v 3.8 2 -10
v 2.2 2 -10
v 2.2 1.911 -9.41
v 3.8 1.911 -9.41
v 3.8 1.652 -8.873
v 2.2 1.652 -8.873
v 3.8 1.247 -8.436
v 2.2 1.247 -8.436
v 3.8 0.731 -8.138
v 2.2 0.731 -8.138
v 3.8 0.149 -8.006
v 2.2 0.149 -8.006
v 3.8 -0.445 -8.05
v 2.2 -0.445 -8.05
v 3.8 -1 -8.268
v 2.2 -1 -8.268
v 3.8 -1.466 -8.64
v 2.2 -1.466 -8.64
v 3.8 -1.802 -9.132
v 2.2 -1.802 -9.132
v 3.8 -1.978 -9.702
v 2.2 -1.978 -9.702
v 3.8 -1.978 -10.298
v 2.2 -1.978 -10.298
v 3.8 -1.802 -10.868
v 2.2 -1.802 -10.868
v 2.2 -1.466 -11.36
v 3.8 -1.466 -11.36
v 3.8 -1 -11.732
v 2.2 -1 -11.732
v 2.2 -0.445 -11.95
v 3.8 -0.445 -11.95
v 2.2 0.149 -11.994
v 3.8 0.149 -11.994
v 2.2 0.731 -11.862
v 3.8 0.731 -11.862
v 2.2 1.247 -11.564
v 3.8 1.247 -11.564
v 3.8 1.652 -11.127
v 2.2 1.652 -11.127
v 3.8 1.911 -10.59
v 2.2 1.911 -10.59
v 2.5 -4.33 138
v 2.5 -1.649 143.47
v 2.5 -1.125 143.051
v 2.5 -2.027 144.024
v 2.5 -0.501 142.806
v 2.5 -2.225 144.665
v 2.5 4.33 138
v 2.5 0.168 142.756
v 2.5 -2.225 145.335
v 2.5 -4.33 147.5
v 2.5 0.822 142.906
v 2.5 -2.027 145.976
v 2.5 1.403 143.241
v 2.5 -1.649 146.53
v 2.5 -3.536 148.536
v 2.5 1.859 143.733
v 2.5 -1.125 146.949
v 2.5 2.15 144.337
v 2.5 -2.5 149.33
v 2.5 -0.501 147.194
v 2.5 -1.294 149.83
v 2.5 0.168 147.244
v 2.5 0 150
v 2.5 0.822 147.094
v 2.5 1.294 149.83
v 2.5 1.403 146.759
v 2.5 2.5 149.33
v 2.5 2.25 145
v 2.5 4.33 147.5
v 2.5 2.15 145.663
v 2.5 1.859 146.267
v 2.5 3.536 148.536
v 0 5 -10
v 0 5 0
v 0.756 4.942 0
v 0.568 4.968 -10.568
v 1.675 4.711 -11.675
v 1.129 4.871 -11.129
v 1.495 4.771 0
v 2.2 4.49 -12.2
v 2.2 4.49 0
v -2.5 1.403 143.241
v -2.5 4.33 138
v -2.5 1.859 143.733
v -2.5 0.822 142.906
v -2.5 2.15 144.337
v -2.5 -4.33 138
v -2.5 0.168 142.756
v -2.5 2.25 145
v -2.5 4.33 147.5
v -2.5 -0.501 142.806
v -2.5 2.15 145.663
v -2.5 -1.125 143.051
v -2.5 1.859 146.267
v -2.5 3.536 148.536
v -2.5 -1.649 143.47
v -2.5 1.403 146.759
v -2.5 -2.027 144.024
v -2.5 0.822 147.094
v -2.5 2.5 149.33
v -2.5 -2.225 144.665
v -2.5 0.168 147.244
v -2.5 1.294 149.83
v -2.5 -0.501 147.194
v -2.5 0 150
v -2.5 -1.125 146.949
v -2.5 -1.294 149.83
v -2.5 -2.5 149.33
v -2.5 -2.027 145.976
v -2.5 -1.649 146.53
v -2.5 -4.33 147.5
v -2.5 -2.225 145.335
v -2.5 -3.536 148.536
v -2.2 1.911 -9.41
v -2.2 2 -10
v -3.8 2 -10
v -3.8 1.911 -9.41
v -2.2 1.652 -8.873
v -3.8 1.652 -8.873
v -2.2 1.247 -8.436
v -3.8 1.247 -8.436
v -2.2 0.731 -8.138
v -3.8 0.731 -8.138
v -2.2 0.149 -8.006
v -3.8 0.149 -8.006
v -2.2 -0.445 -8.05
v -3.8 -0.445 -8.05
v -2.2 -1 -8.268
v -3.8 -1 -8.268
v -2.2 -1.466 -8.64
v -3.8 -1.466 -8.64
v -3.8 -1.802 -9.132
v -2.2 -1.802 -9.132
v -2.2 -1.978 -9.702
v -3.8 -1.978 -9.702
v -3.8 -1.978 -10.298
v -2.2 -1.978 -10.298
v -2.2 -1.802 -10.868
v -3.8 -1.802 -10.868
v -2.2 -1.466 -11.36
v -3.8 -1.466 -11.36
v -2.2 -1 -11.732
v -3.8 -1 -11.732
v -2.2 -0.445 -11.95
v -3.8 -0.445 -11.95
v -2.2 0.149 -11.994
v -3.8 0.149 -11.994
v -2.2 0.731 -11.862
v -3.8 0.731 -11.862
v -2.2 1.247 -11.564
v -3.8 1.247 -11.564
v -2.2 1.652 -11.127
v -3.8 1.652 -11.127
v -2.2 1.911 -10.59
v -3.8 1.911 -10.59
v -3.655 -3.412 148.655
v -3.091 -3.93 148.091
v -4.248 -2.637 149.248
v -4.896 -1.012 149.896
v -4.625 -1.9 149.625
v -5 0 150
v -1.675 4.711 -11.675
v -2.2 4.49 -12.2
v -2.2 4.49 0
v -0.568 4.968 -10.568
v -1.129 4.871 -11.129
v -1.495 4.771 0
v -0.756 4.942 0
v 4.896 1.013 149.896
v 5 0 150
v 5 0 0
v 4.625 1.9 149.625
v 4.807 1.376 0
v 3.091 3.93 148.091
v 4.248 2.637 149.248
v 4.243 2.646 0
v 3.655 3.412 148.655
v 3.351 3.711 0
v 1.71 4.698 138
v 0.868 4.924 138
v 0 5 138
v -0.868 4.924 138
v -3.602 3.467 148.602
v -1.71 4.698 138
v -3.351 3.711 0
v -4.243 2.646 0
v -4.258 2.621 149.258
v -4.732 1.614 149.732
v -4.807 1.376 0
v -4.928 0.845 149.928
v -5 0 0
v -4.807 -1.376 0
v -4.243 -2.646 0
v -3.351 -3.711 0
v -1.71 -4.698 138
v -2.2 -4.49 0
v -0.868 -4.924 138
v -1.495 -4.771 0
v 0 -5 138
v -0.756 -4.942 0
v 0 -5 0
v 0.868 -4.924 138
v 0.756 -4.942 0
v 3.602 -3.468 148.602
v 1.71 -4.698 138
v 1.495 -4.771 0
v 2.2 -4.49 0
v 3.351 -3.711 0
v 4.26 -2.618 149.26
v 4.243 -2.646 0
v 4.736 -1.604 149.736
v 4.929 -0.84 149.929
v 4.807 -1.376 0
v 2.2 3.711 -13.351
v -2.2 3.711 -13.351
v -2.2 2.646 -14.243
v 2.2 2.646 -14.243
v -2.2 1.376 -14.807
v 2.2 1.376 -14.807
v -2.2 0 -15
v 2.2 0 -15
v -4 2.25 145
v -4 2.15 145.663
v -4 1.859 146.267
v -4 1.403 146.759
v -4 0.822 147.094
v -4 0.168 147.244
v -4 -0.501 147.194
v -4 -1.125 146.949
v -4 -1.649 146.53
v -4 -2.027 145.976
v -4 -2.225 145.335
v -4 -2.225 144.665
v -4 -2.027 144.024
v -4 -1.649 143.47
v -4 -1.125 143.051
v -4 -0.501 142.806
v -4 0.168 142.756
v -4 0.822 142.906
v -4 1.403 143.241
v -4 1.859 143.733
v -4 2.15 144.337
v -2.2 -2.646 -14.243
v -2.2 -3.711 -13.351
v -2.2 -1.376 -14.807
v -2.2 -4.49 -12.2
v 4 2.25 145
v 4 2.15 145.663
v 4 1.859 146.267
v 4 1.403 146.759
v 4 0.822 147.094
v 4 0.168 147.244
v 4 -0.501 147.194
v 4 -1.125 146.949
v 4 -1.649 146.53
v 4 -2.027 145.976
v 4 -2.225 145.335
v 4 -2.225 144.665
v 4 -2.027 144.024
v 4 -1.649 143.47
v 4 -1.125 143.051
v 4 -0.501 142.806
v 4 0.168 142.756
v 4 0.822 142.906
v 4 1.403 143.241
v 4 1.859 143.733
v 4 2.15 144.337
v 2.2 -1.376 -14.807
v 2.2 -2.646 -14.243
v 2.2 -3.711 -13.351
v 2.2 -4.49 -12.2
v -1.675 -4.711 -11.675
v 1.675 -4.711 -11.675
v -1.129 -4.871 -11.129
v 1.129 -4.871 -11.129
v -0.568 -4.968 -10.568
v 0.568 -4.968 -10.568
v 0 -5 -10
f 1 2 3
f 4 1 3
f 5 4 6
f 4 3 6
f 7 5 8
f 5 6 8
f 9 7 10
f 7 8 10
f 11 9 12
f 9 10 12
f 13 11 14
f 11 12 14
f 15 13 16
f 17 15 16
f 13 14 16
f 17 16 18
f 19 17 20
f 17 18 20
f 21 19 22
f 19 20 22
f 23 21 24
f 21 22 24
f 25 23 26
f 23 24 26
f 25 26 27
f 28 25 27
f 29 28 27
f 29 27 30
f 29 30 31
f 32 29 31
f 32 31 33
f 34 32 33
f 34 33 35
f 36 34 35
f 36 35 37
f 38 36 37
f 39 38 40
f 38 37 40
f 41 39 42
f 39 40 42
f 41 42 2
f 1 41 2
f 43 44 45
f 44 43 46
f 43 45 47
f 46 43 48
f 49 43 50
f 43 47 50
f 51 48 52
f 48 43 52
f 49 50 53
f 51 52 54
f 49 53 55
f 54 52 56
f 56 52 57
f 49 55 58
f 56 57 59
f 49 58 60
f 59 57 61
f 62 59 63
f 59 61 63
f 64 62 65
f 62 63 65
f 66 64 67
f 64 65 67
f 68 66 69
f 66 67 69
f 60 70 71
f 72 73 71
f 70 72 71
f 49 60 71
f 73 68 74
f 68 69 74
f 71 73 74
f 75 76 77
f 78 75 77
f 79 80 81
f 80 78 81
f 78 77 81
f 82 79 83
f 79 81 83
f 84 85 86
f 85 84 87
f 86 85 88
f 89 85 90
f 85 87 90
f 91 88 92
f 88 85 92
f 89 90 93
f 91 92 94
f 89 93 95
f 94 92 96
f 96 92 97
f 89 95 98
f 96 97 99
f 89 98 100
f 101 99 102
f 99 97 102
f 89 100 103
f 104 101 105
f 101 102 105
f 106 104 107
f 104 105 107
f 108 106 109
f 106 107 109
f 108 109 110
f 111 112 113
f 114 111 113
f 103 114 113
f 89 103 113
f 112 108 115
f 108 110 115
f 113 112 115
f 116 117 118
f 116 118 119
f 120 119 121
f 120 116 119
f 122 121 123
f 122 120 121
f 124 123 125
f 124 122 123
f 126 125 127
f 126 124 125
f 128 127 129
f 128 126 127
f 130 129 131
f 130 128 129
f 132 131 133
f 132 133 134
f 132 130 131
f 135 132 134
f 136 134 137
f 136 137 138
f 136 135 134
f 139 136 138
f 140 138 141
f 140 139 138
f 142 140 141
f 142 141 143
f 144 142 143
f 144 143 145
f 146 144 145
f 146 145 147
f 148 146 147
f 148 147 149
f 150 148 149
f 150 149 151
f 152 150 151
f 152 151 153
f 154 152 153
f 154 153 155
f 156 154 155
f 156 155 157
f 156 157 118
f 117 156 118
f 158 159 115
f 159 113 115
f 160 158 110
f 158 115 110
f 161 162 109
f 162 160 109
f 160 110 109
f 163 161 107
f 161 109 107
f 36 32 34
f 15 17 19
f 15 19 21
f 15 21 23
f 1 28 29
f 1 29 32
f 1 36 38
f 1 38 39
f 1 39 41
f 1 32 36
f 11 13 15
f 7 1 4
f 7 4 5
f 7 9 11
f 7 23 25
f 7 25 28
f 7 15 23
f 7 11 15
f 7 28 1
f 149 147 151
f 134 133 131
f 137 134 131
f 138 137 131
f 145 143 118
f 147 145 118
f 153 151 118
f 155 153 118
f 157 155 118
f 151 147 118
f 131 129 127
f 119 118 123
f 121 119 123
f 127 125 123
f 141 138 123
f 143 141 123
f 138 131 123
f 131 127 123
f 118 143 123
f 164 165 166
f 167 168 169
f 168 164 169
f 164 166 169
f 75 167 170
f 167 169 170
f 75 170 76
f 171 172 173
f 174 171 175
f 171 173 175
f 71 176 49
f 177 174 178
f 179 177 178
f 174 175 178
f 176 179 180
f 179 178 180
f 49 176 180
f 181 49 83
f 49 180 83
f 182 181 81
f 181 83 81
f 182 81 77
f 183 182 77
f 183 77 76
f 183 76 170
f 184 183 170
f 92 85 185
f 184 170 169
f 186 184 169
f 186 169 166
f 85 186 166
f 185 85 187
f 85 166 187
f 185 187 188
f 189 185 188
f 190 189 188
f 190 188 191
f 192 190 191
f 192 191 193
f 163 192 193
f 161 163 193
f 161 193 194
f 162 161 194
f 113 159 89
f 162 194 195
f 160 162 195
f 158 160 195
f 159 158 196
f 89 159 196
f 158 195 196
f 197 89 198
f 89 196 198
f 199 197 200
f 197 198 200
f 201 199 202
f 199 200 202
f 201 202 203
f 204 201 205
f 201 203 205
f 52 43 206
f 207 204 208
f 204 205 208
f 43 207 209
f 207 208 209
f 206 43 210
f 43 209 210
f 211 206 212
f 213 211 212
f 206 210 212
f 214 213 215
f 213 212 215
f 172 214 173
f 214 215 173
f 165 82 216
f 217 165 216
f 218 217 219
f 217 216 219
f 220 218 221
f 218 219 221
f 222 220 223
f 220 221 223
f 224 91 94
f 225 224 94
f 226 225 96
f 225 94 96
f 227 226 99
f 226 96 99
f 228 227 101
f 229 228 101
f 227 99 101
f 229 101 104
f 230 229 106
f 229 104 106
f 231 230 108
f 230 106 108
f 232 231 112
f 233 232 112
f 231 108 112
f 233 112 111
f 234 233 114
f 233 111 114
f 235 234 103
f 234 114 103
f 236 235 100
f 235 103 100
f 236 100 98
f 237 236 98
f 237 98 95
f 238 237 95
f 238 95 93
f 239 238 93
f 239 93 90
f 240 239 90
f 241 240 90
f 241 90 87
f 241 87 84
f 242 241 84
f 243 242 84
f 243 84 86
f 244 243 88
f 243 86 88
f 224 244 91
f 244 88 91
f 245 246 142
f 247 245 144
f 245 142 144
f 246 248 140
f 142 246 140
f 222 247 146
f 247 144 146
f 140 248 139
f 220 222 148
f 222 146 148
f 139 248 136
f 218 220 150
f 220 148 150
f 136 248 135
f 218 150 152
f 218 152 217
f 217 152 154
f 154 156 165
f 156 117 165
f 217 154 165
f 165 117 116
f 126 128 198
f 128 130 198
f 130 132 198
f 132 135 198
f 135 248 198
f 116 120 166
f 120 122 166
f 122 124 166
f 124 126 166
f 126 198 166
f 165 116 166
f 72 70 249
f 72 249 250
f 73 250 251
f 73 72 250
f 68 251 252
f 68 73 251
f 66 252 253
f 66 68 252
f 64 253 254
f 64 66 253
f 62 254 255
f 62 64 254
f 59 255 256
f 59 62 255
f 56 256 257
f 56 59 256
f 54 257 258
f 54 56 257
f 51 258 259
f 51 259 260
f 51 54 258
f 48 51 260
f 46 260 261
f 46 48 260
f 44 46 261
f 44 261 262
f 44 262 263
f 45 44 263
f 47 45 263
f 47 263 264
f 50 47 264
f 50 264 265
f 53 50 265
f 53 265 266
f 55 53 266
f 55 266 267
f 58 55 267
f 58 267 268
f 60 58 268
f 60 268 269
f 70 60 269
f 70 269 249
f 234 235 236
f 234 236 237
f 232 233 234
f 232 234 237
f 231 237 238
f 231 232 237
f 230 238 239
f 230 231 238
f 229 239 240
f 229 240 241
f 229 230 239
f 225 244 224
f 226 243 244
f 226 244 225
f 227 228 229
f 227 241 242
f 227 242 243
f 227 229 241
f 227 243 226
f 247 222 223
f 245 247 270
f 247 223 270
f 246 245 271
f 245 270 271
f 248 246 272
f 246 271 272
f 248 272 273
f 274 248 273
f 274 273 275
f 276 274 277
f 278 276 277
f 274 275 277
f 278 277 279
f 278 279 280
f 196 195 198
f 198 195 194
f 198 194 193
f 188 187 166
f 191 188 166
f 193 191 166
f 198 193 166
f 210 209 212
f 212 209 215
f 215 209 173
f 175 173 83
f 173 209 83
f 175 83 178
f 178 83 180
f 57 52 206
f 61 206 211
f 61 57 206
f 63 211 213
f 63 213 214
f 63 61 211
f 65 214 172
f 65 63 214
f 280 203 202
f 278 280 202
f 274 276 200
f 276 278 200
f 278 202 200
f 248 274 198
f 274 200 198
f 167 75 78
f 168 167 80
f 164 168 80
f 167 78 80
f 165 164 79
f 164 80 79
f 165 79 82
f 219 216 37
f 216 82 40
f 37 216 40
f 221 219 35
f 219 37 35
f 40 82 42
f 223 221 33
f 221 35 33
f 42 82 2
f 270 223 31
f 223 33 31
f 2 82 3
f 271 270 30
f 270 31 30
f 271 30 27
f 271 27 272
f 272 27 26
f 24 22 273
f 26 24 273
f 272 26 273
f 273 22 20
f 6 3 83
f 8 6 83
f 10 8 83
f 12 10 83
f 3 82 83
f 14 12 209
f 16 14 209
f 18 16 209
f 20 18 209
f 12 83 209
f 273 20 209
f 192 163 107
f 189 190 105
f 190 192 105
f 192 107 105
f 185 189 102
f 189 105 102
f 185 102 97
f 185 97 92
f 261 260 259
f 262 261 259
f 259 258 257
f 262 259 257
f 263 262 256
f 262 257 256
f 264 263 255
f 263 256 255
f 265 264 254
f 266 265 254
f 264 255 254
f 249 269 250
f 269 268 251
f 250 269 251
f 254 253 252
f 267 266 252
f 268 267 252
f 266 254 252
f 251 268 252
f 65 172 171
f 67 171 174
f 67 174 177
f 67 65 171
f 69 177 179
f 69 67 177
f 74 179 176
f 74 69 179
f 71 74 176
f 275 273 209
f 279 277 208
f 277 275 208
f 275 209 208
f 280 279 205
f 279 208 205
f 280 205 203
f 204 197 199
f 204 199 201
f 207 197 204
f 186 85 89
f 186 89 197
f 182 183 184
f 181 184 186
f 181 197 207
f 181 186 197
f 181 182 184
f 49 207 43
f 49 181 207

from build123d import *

# Parameters (mm, degrees)
F0_R           = 5
F1_DEPTH       = 150
F3_DEPTH       = 15
F5_DEPTH       = 25
F6_R           = 2
F7_DEPTH       = 1.6
F7_DEPTH_BACK  = 6
F9_DEPTH       = 12
F10_R          = 2.25
F11_DEPTH      = 1.5
F11_DEPTH_BACK = 6.5
F13_DEPTH      = 2.501
F13_DEPTH_BACK = 7.501


with BuildPart() as f1:
    # F0 (on Top) → F1 (new body)
    with BuildSketch(Plane.XY):
        Circle(F0_R)
    extrude(amount=F1_DEPTH)

    # F2 (on face) → F3 (join)
    with BuildSketch(Plane(origin=(0, 0, 0), x_dir=(1, 0, 0), z_dir=(0, 0, -1))):
        with BuildLine():
            ThreePointArc((2.2, 4.4899888641), (1.1291713066, 4.8708286934), (0, 5))
            ThreePointArc((0, 5), (-1.1291713066, 4.8708286934), (-2.2, 4.4899888641))
            Line((-2.2, 4.4899888641), (-2.2, -4.4899888641))
            ThreePointArc((-2.2, -4.4899888641), (-1.1291713066, -4.8708286934), (0, -5))
            ThreePointArc((0, -5), (1.1291713066, -4.8708286934), (2.2, -4.4899888641))
            Line((2.2, -4.4899888641), (2.2, 4.4899888641))
        make_face()
    extrude(amount=F3_DEPTH)

    # F4 (on face) → F5 (cut)
    with BuildSketch(Plane.YZ.offset(2.2)):
        with BuildLine():
            Line((5, -15), (5, -10))
            ThreePointArc((5, -10), (4.8708286934, -11.1291713066), (4.4899888641, -12.2))
            Line((4.4899888641, -12.2), (4.4899888641, -15))
            Line((4.4899888641, -15), (5, -15))
        make_face()
        with BuildLine():
            Line((4.4899888641, -15), (4.4899888641, -12.2))
            ThreePointArc((4.4899888641, -12.2), (2.6457513111, -14.2426406871), (0, -15))
            Line((0, -15), (4.4899888641, -15))
        make_face()
        with BuildLine():
            Line((-4.4899888641, -15), (0, -15))
            ThreePointArc((0, -15), (-2.6457513111, -14.2426406871), (-4.4899888641, -12.2))
            Line((-4.4899888641, -12.2), (-4.4899888641, -15))
        make_face()
        with BuildLine():
            ThreePointArc((-4.4899888641, -12.2), (-4.8708286934, -11.1291713066), (-5, -10))
            Line((-5, -10), (-5, -15))
            Line((-5, -15), (-4.4899888641, -15))
            Line((-4.4899888641, -15), (-4.4899888641, -12.2))
        make_face()
    extrude(amount=-F5_DEPTH, mode=Mode.SUBTRACT)

    # F6 (on face) → F7 (join, two sides)
    with BuildSketch(Plane.YZ.offset(2.2)) as f7_sk:
        with Locations((0, -10)):
            Circle(F6_R)
    extrude(amount=F7_DEPTH)
    extrude(f7_sk.sketch, amount=-F7_DEPTH_BACK)

    # F8 (on face) → F9 (cut)
    with BuildSketch(Plane.XY.offset(150)):
        with BuildLine():
            ThreePointArc((2.5, 4.3301270189), (1.2940952255, 4.8296291314), (0, 5))
            ThreePointArc((0, 5), (-1.2940952255, 4.8296291314), (-2.5, 4.3301270189))
            Line((-2.5, 4.3301270189), (-2.5, -4.3301270189))
            ThreePointArc((-2.5, -4.3301270189), (-1.2940952255, -4.8296291314), (0, -5))
            ThreePointArc((0, -5), (1.2940952255, -4.8296291314), (2.5, -4.3301270189))
            Line((2.5, -4.3301270189), (2.5, 4.3301270189))
        make_face()
    extrude(amount=-F9_DEPTH, mode=Mode.SUBTRACT)

    # F10 (on face) → F11 (cut, two sides)
    with BuildSketch(Plane.YZ.offset(-2.5)) as f11_sk:
        with Locations((0, 145)):
            Circle(F10_R)
    extrude(amount=-F11_DEPTH, mode=Mode.SUBTRACT)
    extrude(f11_sk.sketch, amount=F11_DEPTH_BACK, mode=Mode.SUBTRACT)

    # F12 (on face) → F13 (cut, two sides)
    with BuildSketch(Plane.YZ.offset(-2.5)) as f13_sk:
        with BuildLine():
            ThreePointArc((0, 150), (2.5, 149.3301270189), (4.3301270189, 147.5))
            Line((4.3301270189, 147.5), (4.3301270189, 150))
            Line((4.3301270189, 150), (0, 150))
        make_face()
        with BuildLine():
            ThreePointArc((-4.3301270189, 147.5), (-2.5, 149.3301270189), (0, 150))
            Line((0, 150), (-4.3301270189, 150))
            Line((-4.3301270189, 150), (-4.3301270189, 147.5))
        make_face()
    extrude(amount=-F13_DEPTH, mode=Mode.SUBTRACT)
    extrude(f13_sk.sketch, amount=F13_DEPTH_BACK, mode=Mode.SUBTRACT)


solid = f1.part
